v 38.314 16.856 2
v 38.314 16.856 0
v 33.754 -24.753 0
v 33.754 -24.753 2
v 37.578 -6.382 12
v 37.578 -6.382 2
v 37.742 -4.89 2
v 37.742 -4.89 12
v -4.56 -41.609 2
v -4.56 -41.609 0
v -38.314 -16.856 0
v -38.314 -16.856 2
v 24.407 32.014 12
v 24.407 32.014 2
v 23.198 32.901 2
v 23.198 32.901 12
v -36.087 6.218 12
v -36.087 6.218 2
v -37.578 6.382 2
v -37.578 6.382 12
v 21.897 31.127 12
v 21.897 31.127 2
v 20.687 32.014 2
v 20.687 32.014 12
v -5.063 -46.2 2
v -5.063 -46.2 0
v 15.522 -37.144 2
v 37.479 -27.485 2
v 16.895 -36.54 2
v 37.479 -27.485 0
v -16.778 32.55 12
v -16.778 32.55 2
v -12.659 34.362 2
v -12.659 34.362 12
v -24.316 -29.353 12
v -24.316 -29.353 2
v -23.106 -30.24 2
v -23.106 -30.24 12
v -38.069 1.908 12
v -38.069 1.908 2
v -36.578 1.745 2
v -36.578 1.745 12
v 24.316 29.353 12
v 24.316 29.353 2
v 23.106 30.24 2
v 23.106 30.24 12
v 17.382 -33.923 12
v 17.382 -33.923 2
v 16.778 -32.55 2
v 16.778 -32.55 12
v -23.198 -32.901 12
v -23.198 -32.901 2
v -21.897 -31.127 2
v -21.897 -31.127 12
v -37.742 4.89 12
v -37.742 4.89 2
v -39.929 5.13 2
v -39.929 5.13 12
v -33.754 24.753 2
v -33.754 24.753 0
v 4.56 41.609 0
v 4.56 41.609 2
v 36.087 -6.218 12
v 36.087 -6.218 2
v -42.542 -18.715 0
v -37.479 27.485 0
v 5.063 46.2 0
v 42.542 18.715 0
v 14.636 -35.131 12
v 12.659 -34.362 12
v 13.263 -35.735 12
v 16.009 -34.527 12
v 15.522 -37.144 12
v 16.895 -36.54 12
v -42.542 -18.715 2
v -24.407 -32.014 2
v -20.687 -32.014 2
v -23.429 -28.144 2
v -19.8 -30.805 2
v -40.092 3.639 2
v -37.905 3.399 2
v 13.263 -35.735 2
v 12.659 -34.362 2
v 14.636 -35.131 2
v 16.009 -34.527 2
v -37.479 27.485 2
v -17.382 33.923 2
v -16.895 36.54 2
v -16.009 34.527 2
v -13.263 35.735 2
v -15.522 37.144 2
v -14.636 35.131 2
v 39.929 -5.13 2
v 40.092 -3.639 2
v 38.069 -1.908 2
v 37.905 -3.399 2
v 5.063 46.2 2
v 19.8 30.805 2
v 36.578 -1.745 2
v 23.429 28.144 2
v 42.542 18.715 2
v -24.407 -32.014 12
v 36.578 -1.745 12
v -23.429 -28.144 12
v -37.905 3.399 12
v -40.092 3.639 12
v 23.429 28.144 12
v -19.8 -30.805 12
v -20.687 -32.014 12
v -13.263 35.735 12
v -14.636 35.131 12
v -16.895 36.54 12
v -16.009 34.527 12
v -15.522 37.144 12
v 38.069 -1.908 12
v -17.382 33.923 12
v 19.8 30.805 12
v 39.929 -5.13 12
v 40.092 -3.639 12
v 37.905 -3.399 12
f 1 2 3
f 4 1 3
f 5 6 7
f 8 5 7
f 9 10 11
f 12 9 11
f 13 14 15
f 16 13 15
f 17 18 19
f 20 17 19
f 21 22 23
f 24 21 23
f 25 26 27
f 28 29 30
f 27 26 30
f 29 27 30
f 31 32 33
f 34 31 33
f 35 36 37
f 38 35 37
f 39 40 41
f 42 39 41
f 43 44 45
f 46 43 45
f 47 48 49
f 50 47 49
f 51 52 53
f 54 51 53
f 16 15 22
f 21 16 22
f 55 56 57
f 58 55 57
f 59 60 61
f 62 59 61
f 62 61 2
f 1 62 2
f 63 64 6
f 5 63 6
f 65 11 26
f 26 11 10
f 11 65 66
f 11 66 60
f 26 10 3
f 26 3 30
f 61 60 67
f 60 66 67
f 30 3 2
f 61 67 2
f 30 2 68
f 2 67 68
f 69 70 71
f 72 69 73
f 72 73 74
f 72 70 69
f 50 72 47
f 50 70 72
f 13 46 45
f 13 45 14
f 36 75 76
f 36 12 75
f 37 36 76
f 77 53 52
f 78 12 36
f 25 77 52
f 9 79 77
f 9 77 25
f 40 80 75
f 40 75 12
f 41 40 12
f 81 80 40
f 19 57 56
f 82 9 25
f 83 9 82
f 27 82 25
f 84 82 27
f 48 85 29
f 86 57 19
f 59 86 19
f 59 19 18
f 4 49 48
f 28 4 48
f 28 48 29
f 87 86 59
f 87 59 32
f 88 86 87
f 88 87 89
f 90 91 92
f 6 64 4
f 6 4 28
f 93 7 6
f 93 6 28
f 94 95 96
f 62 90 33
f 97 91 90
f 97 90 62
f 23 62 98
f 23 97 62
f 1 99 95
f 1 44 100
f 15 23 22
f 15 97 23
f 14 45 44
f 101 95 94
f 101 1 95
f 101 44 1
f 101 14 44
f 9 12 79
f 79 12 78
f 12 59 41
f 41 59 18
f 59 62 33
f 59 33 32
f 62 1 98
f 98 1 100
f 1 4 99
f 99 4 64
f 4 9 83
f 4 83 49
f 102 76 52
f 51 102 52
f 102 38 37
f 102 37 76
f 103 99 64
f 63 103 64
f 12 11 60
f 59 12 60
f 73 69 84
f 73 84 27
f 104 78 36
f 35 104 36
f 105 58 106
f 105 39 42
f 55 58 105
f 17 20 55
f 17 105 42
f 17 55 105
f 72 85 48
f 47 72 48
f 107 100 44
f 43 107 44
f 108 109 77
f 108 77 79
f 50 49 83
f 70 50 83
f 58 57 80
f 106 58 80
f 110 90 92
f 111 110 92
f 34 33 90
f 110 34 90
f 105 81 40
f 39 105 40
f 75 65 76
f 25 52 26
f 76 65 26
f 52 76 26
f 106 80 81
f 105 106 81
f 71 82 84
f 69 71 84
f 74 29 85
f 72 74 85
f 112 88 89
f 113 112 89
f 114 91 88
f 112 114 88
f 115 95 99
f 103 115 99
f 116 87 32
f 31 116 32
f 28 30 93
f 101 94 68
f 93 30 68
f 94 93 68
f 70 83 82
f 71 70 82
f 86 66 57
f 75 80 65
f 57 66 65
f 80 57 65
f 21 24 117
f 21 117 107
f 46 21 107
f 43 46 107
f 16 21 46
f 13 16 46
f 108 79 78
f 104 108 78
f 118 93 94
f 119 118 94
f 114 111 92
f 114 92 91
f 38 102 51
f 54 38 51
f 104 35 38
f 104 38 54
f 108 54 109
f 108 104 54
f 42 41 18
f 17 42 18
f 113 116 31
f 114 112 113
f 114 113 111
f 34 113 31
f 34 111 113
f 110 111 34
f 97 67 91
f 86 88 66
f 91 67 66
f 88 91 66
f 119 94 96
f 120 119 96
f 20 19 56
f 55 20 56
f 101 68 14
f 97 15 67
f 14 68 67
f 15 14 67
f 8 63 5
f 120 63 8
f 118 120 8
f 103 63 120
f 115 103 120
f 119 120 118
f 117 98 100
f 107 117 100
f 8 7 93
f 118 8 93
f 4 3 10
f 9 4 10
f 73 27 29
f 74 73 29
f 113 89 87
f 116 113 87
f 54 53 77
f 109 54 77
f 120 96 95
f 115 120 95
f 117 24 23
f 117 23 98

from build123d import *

# Parameters (mm, degrees)
F1_DEPTH = 2
F3_DEPTH = 10


# Not quite as in the source:
# - a feature names something its author has since deleted; it is built from what else it names


with BuildPart() as f1:
    # F0 (on Top) → F1 (new body)
    with BuildSketch(Plane.XY):
        Polygon((-5.0628672683, -46.2001158912), (37.4790403854, -27.4846296159), (42.5419076537, 18.7154862752), (5.0628672683, 46.2001158912), (-37.4790403854, 27.4846296159), (-42.5419076537, -18.7154862752), align=None)
        Polygon((-38.3141404334, -16.8555621733), (-33.7544152539, 24.7532378529), (4.5597251795, 41.6088000262), (38.3141404334, 16.8555621733), (33.7544152539, -24.7532378529), (-4.5597251795, -41.6088000262), align=None, mode=Mode.SUBTRACT)
    extrude(amount=F1_DEPTH)

    # F2 (on face) → F3 (join)
    with BuildSketch(Plane.XY.offset(2)):
        Polygon((-15.5215827184, 37.1443867888), (-16.8945903987, 36.5403587183), (-16.0086825619, 34.5266141206), (-17.3816902422, 33.9225860501), (-16.7776621717, 32.5495783698), (-12.6586391309, 34.3616625813), (-13.2626672014, 35.7346702616), (-14.6356748817, 35.1306421911), align=None)
        Polygon((24.4071912079, 32.0142783355), (23.1975837141, 32.9013238309), (21.8965836541, 31.12723284), (20.6869761604, 32.0142783355), (19.7999306649, 30.8046708417), (23.4287531463, 28.1435343554), (24.3157986417, 29.3531418491), (23.1061911479, 30.2401873446), align=None)
        Polygon((37.7418660296, -4.8904548465), (39.9287739263, -5.1301084533), (40.0921741128, -3.6390348874), (37.905266216, -3.3993812806), (38.0686664025, -1.9083077146), (36.5775928366, -1.7449075281), (36.0873922772, -6.218128226), (37.5784658431, -6.3815284124), align=None)
        Polygon((14.6356748817, -35.1306421911), (15.5215827184, -37.1443867888), (16.8945903987, -36.5403587183), (16.0086825619, -34.5266141206), (17.3816902422, -33.9225860501), (16.7776621717, -32.5495783698), (12.6586391309, -34.3616625813), (13.2626672014, -35.7346702616), align=None)
        Polygon((-23.1061911479, -30.2401873446), (-24.4071912079, -32.0142783355), (-23.1975837141, -32.9013238309), (-21.8965836541, -31.12723284), (-20.6869761604, -32.0142783355), (-19.7999306649, -30.8046708417), (-23.4287531463, -28.1435343554), (-24.3157986417, -29.3531418491), align=None)
        Polygon((-39.9287739263, 5.1301084533), (-40.0921741128, 3.6390348874), (-37.905266216, 3.3993812806), (-38.0686664025, 1.9083077146), (-36.5775928366, 1.7449075281), (-36.0873922772, 6.218128226), (-37.5784658431, 6.3815284124), (-37.7418660296, 4.8904548465), align=None)
    extrude(amount=F3_DEPTH)


solid = f1.part
